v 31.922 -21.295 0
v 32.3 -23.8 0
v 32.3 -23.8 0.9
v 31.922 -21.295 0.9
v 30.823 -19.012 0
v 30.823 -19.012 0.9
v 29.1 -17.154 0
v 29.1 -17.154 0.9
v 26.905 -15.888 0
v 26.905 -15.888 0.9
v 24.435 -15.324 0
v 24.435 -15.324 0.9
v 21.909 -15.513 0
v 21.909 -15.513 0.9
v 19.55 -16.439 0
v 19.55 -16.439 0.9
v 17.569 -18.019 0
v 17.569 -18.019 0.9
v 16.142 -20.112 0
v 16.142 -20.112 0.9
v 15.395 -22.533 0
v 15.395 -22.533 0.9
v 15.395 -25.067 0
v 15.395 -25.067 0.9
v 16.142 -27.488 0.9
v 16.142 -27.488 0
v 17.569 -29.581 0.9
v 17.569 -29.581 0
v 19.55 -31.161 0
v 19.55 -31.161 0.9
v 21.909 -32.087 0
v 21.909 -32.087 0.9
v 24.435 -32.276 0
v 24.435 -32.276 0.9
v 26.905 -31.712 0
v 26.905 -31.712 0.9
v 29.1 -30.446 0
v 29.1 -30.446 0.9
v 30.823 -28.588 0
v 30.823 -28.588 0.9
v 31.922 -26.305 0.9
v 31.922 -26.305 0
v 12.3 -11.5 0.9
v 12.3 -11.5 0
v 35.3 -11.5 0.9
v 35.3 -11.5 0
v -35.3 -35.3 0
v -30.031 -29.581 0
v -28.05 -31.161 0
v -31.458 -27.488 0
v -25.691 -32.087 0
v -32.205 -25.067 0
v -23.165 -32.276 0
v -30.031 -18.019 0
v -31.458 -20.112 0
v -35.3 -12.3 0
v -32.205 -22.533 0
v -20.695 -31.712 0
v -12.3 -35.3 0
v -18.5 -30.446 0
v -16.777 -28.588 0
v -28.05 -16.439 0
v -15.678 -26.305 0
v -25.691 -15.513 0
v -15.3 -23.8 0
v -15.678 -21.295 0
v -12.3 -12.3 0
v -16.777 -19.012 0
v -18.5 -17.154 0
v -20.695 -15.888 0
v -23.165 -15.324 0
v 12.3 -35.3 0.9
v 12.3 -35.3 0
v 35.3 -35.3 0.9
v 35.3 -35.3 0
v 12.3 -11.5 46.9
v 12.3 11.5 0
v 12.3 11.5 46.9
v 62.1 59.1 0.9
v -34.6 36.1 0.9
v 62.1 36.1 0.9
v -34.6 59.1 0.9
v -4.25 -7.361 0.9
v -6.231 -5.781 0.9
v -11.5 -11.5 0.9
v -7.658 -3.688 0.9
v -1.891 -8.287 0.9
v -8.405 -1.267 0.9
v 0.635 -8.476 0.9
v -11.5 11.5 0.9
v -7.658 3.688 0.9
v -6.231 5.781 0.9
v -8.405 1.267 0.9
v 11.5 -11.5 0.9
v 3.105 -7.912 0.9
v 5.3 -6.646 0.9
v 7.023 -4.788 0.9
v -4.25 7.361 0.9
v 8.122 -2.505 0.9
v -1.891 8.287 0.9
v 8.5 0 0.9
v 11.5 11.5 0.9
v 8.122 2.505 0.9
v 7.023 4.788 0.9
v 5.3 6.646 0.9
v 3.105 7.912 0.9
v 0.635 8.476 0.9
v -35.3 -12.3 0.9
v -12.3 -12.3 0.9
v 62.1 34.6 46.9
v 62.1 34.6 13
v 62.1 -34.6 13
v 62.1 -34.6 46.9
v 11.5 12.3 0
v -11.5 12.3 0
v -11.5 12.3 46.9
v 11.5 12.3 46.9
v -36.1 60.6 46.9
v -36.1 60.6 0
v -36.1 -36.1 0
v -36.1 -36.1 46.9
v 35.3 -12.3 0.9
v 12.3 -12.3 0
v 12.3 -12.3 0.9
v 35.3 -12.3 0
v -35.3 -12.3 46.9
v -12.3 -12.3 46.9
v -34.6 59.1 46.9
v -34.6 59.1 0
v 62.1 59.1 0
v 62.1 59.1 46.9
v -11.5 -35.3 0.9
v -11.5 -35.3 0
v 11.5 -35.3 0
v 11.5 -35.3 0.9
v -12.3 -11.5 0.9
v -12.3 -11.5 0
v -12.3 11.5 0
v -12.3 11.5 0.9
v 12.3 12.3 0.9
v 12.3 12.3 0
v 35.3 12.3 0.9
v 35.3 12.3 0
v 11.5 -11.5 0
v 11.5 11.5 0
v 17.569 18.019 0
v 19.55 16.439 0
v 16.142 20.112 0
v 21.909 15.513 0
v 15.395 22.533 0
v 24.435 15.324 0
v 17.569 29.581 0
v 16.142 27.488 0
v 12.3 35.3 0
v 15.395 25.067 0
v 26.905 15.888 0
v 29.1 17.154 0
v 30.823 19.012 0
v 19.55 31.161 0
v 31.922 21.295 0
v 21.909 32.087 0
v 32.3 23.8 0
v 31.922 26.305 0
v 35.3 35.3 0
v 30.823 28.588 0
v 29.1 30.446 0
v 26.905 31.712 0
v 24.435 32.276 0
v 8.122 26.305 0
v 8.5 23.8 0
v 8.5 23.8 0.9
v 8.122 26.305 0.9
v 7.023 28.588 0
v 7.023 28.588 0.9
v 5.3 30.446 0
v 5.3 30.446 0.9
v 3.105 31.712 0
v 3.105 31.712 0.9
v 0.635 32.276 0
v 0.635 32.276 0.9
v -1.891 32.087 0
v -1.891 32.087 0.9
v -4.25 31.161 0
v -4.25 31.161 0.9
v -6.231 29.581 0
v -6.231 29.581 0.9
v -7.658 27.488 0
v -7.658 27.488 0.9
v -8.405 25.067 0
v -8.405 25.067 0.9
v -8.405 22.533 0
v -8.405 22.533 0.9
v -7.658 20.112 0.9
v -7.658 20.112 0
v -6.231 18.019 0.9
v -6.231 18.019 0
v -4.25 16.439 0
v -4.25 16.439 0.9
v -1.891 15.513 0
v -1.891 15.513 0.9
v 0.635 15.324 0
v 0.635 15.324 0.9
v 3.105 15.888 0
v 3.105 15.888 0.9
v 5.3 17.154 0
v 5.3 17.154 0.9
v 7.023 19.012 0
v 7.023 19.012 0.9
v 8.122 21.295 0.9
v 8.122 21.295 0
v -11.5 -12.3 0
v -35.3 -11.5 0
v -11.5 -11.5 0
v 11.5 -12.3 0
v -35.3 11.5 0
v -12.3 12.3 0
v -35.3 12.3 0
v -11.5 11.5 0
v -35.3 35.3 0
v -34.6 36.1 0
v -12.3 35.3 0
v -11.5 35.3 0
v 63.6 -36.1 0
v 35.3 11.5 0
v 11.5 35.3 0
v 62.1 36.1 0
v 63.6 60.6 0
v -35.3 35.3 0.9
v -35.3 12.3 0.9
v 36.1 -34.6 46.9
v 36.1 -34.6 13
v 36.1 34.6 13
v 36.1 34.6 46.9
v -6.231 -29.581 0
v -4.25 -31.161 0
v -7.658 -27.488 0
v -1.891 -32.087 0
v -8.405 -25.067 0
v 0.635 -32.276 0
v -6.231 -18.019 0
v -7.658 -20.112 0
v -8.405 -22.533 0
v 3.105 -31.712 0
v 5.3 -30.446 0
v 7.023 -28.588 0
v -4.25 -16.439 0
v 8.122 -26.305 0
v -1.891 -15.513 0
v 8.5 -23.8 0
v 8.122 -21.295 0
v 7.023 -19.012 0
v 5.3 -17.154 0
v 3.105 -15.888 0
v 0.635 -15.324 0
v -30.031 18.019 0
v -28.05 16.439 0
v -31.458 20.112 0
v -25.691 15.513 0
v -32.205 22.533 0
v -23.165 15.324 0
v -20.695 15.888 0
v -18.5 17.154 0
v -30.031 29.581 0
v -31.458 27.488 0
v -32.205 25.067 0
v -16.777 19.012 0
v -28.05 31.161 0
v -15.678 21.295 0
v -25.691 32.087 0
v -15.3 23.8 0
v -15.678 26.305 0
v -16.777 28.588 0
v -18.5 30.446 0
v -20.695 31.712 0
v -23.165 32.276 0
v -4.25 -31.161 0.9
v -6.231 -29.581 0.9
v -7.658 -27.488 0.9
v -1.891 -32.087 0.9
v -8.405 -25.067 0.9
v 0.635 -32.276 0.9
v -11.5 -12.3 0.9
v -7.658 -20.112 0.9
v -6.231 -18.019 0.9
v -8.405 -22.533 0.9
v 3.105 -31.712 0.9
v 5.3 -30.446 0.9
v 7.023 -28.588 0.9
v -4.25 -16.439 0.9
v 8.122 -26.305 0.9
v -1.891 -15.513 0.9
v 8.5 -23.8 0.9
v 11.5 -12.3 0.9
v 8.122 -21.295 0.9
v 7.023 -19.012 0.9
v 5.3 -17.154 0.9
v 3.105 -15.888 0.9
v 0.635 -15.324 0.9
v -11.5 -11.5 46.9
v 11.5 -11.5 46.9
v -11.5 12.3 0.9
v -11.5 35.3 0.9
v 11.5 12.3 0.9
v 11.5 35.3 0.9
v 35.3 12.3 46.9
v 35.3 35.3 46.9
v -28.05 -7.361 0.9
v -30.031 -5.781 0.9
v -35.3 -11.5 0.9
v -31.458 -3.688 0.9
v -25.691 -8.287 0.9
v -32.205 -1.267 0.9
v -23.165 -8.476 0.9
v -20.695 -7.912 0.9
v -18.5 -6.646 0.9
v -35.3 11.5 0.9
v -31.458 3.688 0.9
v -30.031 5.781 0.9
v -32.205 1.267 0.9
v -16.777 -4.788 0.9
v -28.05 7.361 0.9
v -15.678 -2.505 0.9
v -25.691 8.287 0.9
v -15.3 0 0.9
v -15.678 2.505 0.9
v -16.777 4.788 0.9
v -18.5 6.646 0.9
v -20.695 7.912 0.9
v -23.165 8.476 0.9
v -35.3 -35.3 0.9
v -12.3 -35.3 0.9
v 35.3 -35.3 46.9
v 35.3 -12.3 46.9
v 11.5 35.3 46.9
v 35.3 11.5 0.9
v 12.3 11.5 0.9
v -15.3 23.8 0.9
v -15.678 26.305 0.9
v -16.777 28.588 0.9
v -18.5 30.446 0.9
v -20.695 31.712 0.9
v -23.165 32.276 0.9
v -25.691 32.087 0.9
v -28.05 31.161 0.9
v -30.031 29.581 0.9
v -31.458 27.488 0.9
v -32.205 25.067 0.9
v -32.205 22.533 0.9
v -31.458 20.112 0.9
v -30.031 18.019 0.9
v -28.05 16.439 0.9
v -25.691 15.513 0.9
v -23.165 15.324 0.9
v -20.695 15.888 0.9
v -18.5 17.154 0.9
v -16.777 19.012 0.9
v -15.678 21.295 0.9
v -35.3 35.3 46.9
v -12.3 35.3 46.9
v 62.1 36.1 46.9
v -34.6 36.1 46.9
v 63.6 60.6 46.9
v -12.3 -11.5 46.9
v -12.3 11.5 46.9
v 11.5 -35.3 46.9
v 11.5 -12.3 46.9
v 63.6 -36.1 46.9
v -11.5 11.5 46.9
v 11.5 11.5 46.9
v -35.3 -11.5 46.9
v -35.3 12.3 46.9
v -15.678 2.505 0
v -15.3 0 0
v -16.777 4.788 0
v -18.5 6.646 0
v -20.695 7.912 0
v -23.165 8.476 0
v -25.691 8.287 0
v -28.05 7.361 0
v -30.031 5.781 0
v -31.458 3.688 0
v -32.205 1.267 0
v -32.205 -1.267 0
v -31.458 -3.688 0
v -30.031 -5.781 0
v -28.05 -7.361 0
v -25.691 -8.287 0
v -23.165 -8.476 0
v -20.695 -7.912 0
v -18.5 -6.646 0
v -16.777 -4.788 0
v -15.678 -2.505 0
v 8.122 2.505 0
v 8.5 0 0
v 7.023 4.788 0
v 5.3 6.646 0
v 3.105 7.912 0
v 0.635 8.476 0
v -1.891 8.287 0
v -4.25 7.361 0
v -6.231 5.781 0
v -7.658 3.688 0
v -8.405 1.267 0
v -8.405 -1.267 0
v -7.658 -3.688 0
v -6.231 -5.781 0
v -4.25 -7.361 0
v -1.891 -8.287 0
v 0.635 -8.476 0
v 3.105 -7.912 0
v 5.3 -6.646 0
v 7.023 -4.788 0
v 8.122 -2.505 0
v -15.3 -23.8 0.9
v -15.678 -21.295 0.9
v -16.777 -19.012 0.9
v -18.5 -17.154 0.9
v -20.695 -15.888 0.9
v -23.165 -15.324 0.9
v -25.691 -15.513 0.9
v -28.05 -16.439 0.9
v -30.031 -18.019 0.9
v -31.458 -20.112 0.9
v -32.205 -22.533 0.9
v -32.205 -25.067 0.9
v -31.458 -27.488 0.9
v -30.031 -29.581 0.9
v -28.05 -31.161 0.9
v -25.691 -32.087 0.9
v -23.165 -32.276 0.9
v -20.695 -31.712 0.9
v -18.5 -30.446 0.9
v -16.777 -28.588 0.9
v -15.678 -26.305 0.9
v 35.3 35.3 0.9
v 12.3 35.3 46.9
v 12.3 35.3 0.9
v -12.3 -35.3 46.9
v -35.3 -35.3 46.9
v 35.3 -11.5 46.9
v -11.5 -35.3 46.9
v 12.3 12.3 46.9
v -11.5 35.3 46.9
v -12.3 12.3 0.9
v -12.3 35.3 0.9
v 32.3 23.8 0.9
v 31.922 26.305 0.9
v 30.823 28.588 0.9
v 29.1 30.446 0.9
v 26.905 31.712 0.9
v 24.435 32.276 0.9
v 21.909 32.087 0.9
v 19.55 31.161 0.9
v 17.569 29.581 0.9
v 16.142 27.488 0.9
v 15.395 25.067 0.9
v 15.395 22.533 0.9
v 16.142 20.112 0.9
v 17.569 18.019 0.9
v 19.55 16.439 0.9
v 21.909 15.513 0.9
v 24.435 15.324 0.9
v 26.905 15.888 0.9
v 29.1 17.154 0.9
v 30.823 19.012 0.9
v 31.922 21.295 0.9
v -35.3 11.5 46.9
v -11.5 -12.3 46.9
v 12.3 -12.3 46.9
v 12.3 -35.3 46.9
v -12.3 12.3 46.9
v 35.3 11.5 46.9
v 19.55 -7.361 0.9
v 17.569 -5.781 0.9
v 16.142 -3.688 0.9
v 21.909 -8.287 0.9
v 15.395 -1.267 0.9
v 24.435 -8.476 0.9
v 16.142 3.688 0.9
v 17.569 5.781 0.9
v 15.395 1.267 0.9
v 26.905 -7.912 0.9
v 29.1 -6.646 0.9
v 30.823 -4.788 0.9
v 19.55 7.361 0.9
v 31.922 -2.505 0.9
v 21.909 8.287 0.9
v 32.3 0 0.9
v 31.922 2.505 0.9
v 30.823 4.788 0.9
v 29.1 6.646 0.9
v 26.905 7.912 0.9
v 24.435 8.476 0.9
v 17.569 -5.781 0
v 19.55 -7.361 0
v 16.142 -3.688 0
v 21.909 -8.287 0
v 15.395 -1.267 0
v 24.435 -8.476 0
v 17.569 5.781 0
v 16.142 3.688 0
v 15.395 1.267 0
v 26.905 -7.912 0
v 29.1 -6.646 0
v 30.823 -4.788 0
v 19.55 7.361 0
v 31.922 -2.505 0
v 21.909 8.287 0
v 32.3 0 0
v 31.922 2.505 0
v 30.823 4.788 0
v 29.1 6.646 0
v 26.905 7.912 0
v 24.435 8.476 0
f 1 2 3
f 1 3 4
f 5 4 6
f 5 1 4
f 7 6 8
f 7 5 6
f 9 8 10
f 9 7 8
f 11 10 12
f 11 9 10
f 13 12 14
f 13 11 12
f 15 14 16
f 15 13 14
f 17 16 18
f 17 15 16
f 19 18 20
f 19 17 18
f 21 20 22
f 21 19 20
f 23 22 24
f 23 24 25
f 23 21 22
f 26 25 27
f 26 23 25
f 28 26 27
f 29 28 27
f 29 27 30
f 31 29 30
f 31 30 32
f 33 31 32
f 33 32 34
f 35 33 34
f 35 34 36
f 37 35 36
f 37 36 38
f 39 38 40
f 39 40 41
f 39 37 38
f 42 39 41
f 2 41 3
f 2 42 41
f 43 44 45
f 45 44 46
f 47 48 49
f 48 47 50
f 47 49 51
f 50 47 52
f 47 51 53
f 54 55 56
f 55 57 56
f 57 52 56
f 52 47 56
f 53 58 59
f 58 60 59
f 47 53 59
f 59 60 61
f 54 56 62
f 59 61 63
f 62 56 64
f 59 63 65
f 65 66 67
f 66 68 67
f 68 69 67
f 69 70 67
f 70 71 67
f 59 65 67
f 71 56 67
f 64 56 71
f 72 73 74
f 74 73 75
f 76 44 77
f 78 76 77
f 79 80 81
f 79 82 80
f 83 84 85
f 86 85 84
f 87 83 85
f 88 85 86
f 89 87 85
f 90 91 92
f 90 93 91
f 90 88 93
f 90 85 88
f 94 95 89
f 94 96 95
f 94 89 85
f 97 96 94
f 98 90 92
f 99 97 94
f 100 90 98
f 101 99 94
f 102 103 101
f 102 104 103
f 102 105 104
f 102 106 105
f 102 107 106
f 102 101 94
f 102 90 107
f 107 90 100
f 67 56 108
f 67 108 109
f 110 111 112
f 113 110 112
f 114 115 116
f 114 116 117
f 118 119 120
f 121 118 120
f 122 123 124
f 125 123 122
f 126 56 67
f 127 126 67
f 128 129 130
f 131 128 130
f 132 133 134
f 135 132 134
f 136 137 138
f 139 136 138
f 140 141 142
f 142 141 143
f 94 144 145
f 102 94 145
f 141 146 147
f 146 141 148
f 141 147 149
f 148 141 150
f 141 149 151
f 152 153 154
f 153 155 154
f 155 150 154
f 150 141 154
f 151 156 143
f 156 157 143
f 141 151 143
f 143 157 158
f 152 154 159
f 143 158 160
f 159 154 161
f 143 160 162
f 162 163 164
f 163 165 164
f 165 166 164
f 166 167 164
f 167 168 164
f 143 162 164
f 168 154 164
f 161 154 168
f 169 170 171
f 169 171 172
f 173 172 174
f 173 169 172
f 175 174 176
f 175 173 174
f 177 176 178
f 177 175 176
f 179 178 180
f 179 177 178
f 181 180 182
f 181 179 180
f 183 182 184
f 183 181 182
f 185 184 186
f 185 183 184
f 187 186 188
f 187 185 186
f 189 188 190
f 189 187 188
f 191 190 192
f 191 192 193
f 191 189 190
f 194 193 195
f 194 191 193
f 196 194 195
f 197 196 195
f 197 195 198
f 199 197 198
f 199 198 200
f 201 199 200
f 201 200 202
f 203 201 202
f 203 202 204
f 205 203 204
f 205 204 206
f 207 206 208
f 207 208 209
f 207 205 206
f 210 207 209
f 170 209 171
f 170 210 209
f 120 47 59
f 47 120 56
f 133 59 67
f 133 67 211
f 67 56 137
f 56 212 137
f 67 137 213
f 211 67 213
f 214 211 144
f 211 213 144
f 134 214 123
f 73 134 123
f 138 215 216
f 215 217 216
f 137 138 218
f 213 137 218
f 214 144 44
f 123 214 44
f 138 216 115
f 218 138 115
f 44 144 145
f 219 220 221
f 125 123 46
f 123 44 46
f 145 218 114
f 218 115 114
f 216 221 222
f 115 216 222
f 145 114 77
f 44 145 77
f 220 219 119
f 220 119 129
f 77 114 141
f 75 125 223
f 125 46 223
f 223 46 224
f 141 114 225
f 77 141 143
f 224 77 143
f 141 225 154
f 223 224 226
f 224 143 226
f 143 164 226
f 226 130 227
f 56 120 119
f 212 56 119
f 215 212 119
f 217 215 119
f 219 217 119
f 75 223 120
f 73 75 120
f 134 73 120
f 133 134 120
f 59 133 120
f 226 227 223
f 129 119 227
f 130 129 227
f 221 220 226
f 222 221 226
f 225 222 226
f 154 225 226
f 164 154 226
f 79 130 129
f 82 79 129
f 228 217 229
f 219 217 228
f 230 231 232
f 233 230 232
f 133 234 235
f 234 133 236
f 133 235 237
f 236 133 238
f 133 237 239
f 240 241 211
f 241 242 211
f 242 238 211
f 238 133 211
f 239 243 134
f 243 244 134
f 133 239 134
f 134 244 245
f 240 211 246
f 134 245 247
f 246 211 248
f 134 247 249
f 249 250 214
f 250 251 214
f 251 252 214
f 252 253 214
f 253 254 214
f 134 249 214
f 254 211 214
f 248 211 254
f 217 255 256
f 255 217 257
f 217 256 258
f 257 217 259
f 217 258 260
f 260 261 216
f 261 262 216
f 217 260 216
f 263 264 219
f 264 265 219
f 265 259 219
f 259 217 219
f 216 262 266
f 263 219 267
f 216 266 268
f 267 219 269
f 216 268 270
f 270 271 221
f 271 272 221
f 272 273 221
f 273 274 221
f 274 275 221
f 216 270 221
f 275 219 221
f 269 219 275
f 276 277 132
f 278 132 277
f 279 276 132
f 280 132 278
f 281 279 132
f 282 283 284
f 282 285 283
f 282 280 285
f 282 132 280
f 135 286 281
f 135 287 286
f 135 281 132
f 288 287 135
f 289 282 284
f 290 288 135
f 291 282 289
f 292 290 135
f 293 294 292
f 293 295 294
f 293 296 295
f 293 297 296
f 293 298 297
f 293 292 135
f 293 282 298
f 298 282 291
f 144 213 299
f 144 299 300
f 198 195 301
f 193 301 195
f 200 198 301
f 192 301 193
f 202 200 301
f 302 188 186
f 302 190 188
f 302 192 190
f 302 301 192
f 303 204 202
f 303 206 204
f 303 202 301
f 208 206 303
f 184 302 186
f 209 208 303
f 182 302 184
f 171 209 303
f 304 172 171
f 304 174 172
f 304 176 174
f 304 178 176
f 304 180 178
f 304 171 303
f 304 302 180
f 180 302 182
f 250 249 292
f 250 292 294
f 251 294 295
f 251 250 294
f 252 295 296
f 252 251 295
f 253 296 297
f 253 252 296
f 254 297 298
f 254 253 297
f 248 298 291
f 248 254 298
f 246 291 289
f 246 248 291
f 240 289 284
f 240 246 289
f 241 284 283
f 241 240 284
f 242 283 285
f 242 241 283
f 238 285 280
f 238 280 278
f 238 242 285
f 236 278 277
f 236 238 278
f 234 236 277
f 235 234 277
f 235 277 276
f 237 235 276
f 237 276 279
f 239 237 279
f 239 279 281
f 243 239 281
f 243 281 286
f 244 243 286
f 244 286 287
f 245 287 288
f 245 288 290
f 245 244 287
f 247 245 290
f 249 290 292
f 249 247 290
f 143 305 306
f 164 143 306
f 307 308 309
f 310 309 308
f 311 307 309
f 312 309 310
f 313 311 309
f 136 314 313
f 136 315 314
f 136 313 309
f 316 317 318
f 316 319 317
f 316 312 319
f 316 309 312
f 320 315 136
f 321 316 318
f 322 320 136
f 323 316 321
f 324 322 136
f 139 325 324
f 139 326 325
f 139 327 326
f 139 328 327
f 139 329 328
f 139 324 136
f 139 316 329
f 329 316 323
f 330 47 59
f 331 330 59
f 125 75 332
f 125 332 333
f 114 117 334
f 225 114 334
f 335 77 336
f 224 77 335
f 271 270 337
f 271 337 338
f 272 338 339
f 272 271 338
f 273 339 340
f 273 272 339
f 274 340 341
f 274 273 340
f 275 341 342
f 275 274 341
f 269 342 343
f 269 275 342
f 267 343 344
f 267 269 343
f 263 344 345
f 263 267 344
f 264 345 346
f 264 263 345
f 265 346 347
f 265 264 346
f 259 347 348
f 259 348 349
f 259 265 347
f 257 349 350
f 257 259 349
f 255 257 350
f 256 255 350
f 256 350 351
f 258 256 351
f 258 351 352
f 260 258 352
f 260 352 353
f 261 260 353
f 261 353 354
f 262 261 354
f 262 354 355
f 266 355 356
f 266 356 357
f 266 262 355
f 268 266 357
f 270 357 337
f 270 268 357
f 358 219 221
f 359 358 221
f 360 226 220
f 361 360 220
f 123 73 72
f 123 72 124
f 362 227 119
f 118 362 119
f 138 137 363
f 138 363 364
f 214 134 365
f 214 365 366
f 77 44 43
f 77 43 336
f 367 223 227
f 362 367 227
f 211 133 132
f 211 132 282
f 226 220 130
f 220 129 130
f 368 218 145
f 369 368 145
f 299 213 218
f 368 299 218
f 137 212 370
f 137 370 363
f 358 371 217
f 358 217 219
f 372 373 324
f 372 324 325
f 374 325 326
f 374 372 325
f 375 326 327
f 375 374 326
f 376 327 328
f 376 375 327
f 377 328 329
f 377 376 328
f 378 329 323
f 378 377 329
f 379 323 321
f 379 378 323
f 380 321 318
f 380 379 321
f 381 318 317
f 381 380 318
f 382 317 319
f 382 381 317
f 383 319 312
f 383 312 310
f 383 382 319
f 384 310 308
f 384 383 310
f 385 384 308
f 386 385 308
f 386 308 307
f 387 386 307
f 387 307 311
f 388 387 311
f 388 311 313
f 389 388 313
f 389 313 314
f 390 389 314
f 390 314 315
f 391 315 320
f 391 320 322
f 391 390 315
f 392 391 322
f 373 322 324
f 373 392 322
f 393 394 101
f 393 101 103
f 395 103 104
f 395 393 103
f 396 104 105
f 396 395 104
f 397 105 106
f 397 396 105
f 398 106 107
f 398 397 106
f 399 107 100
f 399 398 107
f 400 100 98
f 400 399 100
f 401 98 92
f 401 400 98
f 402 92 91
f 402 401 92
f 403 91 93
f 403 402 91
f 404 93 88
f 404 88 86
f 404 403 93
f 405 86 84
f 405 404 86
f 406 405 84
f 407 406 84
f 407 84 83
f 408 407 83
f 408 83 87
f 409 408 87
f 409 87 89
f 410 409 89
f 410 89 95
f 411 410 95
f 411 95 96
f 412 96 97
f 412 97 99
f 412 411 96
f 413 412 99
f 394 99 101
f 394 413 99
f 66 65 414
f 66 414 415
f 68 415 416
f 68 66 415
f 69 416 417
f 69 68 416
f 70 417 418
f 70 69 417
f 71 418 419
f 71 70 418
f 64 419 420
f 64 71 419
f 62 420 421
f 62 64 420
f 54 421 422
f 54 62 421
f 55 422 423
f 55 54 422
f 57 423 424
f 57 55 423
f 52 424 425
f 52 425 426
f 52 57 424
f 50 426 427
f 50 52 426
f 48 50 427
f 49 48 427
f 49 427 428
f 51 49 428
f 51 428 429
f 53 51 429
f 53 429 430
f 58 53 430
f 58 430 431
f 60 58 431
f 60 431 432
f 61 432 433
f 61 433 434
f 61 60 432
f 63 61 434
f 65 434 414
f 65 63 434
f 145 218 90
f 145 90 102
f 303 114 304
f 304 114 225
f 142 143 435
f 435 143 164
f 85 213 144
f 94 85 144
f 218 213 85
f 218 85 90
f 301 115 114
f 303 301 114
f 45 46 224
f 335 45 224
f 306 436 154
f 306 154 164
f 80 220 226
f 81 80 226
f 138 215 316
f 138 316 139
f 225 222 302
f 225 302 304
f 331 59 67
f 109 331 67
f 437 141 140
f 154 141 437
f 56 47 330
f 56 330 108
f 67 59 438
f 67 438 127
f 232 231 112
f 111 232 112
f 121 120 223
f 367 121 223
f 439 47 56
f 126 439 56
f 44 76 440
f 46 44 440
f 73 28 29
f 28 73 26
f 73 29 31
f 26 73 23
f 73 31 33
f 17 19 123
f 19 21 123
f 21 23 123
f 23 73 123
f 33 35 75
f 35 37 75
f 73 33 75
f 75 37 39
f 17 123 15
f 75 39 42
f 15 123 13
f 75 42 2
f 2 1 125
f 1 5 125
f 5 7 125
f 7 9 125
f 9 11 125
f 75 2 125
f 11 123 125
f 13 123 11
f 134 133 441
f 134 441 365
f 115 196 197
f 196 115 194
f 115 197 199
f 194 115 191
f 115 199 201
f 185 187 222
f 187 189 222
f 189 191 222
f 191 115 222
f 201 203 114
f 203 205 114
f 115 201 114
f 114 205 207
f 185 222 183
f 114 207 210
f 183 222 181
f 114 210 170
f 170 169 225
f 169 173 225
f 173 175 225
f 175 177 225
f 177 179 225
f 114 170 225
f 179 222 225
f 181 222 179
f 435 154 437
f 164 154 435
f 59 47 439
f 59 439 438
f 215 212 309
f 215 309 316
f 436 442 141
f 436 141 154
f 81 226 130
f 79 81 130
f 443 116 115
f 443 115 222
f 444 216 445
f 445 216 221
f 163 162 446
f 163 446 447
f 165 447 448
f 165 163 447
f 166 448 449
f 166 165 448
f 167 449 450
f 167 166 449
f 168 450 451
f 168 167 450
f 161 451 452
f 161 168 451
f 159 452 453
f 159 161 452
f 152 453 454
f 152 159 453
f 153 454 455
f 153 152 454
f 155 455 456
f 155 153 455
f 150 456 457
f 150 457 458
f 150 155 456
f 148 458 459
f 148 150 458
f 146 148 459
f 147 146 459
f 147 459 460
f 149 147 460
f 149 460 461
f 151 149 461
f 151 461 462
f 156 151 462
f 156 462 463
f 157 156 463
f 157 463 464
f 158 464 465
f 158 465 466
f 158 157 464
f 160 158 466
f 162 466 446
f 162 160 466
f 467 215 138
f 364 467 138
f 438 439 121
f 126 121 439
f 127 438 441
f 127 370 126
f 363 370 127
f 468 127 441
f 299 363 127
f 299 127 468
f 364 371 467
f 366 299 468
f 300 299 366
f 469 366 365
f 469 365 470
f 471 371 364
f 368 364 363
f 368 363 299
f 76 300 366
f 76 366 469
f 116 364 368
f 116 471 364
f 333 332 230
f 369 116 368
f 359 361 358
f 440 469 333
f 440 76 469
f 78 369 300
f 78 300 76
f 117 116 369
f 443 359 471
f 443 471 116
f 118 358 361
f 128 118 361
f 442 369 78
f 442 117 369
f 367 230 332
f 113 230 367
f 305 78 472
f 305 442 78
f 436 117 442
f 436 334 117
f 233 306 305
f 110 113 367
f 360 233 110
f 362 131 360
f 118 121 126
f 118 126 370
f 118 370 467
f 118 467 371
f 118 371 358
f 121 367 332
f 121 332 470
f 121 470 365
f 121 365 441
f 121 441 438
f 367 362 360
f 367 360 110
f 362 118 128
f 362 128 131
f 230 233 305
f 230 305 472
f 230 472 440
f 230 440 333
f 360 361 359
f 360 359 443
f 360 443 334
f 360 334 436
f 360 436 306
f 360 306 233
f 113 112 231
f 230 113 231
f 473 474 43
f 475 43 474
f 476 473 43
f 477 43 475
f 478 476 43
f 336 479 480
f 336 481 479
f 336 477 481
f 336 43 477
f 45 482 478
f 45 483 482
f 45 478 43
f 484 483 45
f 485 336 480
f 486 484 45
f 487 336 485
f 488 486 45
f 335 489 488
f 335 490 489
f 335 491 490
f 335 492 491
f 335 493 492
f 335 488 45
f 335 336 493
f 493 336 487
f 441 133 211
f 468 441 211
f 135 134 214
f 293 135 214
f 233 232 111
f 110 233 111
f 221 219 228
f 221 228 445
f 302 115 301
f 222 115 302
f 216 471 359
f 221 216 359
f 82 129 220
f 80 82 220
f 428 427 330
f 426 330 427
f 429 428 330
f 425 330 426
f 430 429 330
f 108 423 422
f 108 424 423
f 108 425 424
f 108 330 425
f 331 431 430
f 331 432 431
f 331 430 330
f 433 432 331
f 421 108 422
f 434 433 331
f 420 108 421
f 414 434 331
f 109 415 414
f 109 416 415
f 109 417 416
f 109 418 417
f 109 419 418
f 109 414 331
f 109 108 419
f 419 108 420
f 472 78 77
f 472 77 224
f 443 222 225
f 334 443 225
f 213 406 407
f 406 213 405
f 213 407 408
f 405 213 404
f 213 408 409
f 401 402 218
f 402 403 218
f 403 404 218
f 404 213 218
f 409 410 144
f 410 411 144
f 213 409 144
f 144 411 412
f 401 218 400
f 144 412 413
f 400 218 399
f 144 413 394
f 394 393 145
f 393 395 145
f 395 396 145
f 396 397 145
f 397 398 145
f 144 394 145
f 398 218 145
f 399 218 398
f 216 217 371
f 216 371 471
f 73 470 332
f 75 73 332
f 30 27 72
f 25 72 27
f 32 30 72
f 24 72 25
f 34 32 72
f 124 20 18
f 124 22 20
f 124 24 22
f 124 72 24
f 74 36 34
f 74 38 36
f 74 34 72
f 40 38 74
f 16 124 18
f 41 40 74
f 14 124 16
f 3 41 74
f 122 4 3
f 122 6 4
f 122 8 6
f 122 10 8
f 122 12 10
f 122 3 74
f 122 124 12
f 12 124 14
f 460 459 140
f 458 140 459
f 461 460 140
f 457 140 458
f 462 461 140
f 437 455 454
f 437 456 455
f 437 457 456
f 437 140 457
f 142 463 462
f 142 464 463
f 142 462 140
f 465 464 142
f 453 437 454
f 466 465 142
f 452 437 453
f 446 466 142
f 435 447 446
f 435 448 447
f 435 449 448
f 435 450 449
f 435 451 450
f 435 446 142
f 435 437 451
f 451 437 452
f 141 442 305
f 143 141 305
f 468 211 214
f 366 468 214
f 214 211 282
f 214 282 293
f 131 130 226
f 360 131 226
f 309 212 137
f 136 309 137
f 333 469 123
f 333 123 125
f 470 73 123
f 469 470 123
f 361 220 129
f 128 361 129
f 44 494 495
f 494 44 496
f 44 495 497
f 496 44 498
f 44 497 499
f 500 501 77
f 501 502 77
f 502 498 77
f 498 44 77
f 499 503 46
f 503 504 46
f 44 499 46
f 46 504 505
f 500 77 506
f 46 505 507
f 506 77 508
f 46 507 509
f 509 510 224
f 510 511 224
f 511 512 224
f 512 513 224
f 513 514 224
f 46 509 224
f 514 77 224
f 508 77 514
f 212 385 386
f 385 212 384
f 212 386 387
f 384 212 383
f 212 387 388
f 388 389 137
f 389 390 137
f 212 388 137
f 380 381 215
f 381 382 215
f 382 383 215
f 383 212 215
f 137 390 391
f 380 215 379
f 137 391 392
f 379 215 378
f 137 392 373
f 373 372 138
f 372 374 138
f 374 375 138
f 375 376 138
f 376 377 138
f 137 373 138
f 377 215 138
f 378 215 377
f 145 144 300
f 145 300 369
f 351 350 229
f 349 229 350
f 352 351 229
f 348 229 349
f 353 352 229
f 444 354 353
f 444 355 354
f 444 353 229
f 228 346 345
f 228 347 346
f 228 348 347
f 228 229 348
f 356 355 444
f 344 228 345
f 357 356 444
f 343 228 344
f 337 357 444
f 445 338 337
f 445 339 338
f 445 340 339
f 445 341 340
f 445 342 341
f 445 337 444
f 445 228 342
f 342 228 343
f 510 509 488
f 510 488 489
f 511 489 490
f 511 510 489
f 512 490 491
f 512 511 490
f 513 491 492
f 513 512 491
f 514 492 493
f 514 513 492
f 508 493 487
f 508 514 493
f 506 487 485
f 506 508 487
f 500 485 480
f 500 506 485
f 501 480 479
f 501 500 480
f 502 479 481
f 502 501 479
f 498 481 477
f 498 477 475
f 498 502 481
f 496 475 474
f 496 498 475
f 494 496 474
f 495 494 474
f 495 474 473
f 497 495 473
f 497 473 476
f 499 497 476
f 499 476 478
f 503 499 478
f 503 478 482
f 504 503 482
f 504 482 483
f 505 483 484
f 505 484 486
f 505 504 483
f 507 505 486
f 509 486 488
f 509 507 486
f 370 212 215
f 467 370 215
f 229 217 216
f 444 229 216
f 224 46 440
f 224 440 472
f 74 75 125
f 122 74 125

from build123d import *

# Parameters (mm, degrees)
F0_W     = 23
F0_H     = 23
F0_R     = 8.5
F1_DEPTH = 0.9
F2_DEPTH = 46.9
F0_W_2   = 26
F0_H_2   = 69.2
F3_DEPTH = 13


with BuildPart() as f1:
    # F0 (on Top) → F1 (new body)
    with BuildSketch(Plane.XY):
        with Locations((-23.8, 23.8)):
            Rectangle(F0_W, F0_H)
        with Locations((-23.8, 23.8)):
            Circle(F0_R, mode=Mode.SUBTRACT)
        with Locations((0, 23.8)):
            Rectangle(F0_W, F0_H)
        with Locations((0, 23.8)):
            Circle(F0_R, mode=Mode.SUBTRACT)
        with Locations((23.8, 23.8)):
            Rectangle(F0_W, F0_H)
        with Locations((23.8, 23.8)):
            Circle(F0_R, mode=Mode.SUBTRACT)
        with Locations((23.8, 0)):
            Rectangle(F0_W, F0_H)
        with Locations((23.8, 0)):
            Circle(F0_R, mode=Mode.SUBTRACT)
        Rectangle(F0_W, F0_H)
        Circle(F0_R, mode=Mode.SUBTRACT)
        with Locations((-23.8, 0)):
            Rectangle(F0_W, F0_H)
        with Locations((-23.8, 0)):
            Circle(F0_R, mode=Mode.SUBTRACT)
        with Locations((-23.8, -23.8)):
            Rectangle(F0_W, F0_H)
        with Locations((-23.8, -23.8)):
            Circle(F0_R, mode=Mode.SUBTRACT)
        with Locations((0, -23.8)):
            Rectangle(F0_W, F0_H)
        with Locations((0, -23.8)):
            Circle(F0_R, mode=Mode.SUBTRACT)
        with Locations((23.8, -23.8)):
            Rectangle(F0_W, F0_H)
        with Locations((23.8, -23.8)):
            Circle(F0_R, mode=Mode.SUBTRACT)
        Polygon((-34.6, 36.9), (-34.6, 36.1), (36.1, 36.1), (62.1, 36.1), (62.1, 36.9), (62.1, 59.1), (-34.6, 59.1), align=None)
    extrude(amount=F1_DEPTH)


with BuildPart() as f2:
    # F0 (on Top) → F2 (new body)
    with BuildSketch(Plane.XY):
        Polygon((-36.1, 60.6), (-36.1, 36.1), (-34.6, 36.1), (-34.6, 36.9), (-34.6, 59.1), (62.1, 59.1), (62.1, 36.9), (62.1, 36.1), (63.6, 36.1), (63.6, 60.6), align=None)
        Polygon((36.1, -34.6), (36.1, -36.1), (63.6, -36.1), (63.6, 36.1), (62.1, 36.1), (36.1, 36.1), (36.1, 34.6), (62.1, 34.6), (62.1, -34.6), align=None)
        Polygon((-34.6, 36.1), (-36.1, 36.1), (-36.1, -36.1), (36.1, -36.1), (36.1, -34.6), (36.1, 34.6), (36.1, 36.1), align=None)
        with Locations((-23.8, -23.8)):
            Rectangle(F0_W, F0_H, mode=Mode.SUBTRACT)
        with Locations((0, -23.8)):
            Rectangle(F0_W, F0_H, mode=Mode.SUBTRACT)
        with Locations((-23.8, 0)):
            Rectangle(F0_W, F0_H, mode=Mode.SUBTRACT)
        Rectangle(F0_W, F0_H, mode=Mode.SUBTRACT)
        with Locations((23.8, -23.8)):
            Rectangle(F0_W, F0_H, mode=Mode.SUBTRACT)
        with Locations((23.8, 0)):
            Rectangle(F0_W, F0_H, mode=Mode.SUBTRACT)
        with Locations((-23.8, 23.8)):
            Rectangle(F0_W, F0_H, mode=Mode.SUBTRACT)
        with Locations((0, 23.8)):
            Rectangle(F0_W, F0_H, mode=Mode.SUBTRACT)
        with Locations((23.8, 23.8)):
            Rectangle(F0_W, F0_H, mode=Mode.SUBTRACT)
    extrude(amount=F2_DEPTH)

    # F0 (on Top) → F3 (join)
    with BuildSketch(Plane.XY):
        with Locations((49.1, 0)):
            Rectangle(F0_W_2, F0_H_2)
    extrude(amount=F3_DEPTH)


solid = Compound([f1.part, f2.part])
